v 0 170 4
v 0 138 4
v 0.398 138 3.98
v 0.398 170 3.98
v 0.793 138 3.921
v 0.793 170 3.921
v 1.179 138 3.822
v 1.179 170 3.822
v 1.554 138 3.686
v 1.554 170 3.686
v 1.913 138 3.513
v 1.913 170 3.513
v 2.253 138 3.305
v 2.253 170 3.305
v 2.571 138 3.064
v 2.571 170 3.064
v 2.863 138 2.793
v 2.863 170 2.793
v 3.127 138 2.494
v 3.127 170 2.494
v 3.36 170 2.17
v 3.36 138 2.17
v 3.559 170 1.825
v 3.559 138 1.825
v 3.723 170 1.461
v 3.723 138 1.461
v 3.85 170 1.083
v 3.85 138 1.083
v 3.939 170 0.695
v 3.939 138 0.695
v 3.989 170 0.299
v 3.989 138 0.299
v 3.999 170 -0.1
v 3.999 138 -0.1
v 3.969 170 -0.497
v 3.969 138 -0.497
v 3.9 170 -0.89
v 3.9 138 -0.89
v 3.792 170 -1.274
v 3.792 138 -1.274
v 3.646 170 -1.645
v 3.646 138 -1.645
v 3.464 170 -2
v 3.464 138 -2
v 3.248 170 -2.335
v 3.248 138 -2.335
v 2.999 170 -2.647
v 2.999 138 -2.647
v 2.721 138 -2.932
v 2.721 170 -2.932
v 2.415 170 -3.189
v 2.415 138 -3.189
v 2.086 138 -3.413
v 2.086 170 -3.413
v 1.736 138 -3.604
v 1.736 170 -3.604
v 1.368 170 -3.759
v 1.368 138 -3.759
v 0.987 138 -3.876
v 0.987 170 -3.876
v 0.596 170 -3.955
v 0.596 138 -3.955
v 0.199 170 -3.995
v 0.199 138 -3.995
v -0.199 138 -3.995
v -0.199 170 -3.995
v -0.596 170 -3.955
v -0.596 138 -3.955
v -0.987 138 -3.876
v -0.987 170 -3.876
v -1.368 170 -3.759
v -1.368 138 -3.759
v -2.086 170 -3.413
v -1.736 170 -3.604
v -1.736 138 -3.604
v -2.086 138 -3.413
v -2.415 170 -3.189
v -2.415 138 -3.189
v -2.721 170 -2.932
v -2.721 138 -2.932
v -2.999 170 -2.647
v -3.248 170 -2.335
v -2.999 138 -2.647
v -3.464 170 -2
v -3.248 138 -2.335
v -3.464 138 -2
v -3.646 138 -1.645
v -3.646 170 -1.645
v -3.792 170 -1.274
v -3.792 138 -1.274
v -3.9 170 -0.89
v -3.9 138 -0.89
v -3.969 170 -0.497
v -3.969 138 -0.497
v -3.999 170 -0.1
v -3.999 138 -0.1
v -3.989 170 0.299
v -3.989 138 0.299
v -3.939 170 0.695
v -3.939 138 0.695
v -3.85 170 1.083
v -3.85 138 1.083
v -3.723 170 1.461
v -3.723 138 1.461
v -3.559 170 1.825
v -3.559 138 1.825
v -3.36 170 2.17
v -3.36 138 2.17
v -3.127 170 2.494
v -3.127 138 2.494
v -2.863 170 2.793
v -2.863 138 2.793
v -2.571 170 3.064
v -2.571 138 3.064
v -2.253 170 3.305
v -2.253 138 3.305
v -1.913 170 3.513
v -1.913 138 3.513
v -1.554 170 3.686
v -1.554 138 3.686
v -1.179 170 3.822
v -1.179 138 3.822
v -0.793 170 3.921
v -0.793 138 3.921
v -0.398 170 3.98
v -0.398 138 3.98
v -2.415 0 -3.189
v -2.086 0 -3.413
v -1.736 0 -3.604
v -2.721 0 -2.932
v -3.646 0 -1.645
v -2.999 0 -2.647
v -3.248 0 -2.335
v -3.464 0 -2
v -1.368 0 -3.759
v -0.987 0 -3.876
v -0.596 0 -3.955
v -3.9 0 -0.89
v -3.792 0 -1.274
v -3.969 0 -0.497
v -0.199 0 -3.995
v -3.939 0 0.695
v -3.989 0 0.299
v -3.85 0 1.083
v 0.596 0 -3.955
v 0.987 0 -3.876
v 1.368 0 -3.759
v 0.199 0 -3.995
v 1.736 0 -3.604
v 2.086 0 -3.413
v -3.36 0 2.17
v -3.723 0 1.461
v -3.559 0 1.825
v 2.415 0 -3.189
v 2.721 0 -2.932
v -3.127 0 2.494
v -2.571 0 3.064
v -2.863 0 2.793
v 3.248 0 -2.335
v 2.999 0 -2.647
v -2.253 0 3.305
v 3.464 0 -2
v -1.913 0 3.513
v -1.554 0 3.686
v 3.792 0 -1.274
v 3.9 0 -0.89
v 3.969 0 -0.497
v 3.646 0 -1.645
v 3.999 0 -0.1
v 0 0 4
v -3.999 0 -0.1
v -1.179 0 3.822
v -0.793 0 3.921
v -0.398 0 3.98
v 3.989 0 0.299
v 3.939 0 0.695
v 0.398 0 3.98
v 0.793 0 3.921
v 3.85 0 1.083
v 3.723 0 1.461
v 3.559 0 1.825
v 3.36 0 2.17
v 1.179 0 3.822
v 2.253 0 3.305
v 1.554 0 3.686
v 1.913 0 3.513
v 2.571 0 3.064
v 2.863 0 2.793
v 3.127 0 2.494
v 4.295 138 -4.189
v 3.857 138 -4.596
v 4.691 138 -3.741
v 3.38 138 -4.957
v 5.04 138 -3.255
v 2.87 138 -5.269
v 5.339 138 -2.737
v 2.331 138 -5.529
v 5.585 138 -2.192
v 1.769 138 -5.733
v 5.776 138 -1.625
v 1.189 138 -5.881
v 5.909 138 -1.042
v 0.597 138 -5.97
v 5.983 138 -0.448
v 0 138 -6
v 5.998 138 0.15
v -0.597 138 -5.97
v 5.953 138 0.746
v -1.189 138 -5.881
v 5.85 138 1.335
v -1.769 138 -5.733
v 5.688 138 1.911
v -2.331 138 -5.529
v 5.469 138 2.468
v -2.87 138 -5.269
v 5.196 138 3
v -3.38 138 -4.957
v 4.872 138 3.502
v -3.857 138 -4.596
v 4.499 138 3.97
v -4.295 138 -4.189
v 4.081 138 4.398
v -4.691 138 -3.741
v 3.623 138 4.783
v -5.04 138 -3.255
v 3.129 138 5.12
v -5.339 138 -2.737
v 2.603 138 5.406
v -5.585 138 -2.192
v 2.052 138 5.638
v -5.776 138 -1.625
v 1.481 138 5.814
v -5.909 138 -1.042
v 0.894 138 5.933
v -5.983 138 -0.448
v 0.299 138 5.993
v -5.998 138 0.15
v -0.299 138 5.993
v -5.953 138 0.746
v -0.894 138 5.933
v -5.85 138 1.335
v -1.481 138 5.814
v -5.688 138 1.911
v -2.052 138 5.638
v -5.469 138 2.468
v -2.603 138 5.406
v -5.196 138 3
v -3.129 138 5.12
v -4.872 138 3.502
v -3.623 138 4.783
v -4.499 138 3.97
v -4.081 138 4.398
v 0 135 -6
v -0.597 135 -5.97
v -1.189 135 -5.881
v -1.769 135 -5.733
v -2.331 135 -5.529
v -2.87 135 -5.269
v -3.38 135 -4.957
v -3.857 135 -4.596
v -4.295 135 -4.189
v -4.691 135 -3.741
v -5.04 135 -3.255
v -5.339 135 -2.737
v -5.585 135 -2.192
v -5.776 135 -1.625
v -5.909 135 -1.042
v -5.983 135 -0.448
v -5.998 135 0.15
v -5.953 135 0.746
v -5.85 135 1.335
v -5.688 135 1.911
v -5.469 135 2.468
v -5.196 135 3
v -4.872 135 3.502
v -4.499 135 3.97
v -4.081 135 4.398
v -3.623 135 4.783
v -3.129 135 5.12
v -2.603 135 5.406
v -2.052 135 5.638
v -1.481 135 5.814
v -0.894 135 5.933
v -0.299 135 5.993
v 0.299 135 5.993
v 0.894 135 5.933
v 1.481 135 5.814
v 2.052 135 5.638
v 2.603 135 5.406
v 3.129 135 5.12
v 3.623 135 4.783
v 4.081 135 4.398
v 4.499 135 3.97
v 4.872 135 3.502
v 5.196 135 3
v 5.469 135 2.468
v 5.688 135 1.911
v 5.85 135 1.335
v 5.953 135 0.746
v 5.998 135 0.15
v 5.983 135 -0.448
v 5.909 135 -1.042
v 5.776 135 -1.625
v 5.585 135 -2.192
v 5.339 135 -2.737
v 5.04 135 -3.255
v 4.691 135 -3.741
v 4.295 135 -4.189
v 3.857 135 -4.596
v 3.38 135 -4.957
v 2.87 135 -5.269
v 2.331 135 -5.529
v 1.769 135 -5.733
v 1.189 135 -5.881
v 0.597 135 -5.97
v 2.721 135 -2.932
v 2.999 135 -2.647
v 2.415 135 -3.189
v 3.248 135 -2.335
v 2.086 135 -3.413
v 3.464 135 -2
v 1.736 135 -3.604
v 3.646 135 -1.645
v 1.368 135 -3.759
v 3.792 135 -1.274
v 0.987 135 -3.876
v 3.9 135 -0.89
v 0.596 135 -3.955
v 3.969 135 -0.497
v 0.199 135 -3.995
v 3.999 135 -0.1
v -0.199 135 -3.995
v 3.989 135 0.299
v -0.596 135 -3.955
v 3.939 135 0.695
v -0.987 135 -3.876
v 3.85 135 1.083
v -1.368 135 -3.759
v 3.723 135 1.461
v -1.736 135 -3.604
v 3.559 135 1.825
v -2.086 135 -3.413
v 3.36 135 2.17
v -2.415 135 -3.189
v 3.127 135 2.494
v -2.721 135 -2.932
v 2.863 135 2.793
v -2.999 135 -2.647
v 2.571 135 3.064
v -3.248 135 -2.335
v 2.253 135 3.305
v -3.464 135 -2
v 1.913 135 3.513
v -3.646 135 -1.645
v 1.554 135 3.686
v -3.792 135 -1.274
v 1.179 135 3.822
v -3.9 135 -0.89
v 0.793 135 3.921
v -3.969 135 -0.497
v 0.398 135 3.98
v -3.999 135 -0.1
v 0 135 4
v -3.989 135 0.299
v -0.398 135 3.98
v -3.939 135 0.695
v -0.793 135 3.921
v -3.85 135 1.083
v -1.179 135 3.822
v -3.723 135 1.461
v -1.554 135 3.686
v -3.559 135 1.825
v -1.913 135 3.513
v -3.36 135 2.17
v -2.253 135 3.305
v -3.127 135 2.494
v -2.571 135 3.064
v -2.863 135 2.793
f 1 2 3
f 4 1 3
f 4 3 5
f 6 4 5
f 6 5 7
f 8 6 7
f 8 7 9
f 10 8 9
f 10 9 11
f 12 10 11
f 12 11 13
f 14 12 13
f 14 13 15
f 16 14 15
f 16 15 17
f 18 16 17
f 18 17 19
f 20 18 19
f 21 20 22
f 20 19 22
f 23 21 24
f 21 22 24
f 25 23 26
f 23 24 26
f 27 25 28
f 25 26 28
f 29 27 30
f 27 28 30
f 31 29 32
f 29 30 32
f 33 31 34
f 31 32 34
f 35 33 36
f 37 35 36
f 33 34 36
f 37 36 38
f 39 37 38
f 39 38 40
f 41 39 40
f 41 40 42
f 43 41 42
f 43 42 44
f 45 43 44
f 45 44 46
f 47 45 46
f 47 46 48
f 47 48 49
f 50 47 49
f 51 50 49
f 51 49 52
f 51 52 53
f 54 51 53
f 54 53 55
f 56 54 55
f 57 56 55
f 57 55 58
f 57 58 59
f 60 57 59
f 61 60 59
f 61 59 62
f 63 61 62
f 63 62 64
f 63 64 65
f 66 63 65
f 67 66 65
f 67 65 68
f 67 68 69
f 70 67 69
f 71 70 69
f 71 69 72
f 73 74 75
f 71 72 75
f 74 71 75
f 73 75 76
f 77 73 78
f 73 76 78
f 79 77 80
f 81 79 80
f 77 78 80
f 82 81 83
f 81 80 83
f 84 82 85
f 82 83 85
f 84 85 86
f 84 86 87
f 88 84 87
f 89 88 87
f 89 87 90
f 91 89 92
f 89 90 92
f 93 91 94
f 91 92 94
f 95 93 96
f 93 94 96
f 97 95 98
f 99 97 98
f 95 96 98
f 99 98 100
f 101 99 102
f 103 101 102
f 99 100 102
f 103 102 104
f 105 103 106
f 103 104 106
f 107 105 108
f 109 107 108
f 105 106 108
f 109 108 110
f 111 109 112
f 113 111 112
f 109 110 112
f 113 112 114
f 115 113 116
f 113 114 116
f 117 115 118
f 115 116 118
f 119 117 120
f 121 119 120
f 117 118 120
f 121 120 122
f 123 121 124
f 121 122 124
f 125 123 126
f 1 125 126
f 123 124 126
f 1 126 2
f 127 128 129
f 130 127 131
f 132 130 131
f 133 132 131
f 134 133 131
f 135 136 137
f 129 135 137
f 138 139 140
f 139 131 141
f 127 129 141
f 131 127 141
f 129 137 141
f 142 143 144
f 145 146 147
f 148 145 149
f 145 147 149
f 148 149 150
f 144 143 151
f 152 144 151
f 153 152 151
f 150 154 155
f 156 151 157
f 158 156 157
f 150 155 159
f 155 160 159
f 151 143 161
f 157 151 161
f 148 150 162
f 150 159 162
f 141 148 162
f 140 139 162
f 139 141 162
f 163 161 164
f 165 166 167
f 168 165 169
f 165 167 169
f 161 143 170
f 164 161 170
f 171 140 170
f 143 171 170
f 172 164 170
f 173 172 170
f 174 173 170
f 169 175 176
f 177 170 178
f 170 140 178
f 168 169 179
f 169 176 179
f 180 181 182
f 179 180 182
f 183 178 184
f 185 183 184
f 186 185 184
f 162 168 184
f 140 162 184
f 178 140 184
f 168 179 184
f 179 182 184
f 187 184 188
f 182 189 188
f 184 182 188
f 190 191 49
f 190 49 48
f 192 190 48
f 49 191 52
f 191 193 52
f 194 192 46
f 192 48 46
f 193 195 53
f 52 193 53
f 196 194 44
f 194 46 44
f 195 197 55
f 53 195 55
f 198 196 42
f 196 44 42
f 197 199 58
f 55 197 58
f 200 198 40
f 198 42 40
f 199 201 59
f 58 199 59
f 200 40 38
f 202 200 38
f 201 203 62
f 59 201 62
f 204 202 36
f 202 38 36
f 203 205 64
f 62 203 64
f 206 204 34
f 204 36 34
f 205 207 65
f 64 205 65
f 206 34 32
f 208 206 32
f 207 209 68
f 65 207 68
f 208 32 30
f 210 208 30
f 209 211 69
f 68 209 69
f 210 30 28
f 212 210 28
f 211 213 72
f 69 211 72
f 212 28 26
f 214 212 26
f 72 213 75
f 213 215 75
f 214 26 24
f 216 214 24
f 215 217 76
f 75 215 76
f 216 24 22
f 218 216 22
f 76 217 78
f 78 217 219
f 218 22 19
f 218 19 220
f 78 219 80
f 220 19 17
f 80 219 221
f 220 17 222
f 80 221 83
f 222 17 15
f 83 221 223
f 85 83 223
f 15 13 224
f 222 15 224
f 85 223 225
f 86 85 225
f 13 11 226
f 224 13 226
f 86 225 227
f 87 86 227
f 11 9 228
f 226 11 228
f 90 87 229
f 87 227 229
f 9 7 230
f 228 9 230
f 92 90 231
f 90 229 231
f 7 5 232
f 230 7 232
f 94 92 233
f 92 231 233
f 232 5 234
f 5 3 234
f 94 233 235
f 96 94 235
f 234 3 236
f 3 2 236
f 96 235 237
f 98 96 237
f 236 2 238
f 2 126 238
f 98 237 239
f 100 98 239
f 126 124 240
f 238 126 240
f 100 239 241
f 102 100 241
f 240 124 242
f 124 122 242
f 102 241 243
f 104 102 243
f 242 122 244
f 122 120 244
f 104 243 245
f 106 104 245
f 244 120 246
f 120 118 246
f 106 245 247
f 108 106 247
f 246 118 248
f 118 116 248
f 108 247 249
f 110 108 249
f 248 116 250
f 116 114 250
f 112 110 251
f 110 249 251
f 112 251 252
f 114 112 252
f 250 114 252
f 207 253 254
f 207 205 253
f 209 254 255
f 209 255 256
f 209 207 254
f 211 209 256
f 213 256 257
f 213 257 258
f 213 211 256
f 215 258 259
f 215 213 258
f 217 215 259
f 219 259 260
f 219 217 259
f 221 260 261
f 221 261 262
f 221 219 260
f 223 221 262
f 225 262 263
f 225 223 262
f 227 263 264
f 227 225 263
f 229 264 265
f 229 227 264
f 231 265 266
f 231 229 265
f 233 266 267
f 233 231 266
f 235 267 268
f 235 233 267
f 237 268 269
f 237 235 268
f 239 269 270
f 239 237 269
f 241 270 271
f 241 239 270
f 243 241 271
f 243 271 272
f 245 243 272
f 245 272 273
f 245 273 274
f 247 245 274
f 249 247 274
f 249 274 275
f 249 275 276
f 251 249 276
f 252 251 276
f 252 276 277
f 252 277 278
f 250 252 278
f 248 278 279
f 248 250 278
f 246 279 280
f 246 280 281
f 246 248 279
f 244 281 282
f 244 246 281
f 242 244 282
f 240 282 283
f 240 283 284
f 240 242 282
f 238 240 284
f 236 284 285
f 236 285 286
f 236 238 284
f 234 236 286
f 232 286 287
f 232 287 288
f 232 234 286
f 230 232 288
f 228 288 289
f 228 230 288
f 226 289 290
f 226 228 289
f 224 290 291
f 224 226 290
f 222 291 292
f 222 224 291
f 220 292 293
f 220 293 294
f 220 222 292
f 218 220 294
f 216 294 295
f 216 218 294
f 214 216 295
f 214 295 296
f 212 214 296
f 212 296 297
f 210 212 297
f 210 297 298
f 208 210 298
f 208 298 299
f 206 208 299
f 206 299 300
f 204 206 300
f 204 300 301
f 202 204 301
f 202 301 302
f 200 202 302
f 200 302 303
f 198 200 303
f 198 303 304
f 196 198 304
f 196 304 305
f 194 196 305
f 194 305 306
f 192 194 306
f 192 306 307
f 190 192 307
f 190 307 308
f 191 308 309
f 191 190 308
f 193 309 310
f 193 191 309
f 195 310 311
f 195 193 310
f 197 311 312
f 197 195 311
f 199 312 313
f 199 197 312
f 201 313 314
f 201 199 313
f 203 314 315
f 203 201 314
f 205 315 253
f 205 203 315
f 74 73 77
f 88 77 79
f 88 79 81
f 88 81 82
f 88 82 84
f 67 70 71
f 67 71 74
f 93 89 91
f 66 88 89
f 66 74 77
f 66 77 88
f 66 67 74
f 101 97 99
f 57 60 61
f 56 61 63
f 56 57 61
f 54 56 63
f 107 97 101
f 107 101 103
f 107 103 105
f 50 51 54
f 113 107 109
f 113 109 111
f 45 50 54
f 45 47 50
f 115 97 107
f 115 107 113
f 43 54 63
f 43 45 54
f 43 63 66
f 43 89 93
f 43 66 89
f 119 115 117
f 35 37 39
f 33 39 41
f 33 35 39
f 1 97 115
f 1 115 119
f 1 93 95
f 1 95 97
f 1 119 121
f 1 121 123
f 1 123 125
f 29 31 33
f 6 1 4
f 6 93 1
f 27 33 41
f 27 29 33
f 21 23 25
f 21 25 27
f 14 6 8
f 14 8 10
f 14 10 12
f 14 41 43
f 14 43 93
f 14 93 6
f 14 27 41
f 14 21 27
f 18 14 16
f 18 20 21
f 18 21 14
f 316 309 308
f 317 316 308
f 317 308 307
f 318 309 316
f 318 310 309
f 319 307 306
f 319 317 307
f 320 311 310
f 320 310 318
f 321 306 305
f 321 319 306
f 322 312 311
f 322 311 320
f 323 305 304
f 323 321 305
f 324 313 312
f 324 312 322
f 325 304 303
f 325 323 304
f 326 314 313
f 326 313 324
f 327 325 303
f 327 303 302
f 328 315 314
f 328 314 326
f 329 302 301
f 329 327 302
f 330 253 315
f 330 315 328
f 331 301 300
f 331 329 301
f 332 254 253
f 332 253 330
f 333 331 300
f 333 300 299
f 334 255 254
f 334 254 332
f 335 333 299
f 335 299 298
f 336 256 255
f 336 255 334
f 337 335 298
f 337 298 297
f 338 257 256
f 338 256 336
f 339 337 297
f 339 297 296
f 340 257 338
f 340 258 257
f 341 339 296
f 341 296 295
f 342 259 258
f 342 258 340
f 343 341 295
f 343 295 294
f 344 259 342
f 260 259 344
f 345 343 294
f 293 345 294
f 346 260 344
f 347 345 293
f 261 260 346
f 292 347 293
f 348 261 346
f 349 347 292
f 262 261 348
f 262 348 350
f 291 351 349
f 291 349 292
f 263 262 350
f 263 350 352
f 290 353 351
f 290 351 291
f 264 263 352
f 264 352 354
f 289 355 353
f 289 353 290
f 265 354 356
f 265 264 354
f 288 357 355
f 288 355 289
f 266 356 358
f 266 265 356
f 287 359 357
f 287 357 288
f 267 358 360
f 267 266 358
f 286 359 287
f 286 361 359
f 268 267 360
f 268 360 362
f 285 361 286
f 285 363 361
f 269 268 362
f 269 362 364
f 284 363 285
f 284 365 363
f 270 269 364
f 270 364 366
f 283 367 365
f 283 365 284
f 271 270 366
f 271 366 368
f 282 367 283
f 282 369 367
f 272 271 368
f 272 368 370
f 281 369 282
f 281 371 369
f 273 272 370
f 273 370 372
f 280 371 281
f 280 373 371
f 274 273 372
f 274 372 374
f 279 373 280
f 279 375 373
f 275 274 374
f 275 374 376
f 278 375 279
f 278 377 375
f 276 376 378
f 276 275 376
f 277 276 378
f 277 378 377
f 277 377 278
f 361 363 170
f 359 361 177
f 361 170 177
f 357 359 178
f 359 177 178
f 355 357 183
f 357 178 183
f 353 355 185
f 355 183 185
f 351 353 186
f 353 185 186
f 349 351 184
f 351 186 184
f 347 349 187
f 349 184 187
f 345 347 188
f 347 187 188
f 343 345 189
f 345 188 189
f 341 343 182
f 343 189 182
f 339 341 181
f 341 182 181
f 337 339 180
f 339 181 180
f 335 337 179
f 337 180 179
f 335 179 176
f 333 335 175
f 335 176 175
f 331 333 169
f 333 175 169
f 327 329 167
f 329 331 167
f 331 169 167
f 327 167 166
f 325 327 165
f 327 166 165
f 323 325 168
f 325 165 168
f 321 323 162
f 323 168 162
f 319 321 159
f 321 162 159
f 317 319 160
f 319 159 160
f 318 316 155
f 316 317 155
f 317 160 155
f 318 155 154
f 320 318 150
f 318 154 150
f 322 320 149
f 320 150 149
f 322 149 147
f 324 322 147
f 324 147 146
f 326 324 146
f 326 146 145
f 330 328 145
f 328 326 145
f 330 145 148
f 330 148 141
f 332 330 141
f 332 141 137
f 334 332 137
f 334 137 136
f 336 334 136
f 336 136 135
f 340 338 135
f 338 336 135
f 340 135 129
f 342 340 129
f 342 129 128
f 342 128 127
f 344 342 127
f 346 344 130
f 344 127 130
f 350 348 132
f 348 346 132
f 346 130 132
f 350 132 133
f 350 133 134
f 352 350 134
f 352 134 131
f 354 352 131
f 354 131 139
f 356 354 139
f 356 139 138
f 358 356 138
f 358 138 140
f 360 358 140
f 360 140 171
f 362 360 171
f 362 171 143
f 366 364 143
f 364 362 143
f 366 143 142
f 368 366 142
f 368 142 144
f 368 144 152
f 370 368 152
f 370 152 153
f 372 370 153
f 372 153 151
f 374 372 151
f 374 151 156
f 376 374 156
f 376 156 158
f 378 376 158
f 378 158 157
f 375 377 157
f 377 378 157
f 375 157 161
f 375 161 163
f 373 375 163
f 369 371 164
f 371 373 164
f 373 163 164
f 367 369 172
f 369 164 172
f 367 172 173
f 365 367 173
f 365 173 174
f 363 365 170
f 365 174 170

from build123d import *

# Parameters (mm, degrees)
SKETCH1_R           = 4
BOSS_EXTRUDE1_DEPTH = 170
SKETCH16_W          = 6
SKETCH16_H          = 3


with BuildPart() as part:
    # Sketch1 → Boss-Extrude1 (new body)
    with BuildSketch(Plane(origin=(0, 0, 0), x_dir=(1, 0, 0), z_dir=(0, 1, 0))):
        with Locations(Location((0, 0, 0), (0, 0, 270))):
            Circle(SKETCH1_R)
    extrude(amount=BOSS_EXTRUDE1_DEPTH)

    # Sketch16 → Revolve1 (revolve)
    with BuildSketch(Plane.XY, mode=Mode.PRIVATE) as revolve1_sk:
        with Locations((3, 136.5)):
            Rectangle(SKETCH16_W, SKETCH16_H)
    revolve(revolve1_sk.sketch.rotate(Axis((0, 135, 0), (0, 1, 0)), 90), axis=Axis((0, 135, 0), (0, 1, 0)))


solid = part.part
